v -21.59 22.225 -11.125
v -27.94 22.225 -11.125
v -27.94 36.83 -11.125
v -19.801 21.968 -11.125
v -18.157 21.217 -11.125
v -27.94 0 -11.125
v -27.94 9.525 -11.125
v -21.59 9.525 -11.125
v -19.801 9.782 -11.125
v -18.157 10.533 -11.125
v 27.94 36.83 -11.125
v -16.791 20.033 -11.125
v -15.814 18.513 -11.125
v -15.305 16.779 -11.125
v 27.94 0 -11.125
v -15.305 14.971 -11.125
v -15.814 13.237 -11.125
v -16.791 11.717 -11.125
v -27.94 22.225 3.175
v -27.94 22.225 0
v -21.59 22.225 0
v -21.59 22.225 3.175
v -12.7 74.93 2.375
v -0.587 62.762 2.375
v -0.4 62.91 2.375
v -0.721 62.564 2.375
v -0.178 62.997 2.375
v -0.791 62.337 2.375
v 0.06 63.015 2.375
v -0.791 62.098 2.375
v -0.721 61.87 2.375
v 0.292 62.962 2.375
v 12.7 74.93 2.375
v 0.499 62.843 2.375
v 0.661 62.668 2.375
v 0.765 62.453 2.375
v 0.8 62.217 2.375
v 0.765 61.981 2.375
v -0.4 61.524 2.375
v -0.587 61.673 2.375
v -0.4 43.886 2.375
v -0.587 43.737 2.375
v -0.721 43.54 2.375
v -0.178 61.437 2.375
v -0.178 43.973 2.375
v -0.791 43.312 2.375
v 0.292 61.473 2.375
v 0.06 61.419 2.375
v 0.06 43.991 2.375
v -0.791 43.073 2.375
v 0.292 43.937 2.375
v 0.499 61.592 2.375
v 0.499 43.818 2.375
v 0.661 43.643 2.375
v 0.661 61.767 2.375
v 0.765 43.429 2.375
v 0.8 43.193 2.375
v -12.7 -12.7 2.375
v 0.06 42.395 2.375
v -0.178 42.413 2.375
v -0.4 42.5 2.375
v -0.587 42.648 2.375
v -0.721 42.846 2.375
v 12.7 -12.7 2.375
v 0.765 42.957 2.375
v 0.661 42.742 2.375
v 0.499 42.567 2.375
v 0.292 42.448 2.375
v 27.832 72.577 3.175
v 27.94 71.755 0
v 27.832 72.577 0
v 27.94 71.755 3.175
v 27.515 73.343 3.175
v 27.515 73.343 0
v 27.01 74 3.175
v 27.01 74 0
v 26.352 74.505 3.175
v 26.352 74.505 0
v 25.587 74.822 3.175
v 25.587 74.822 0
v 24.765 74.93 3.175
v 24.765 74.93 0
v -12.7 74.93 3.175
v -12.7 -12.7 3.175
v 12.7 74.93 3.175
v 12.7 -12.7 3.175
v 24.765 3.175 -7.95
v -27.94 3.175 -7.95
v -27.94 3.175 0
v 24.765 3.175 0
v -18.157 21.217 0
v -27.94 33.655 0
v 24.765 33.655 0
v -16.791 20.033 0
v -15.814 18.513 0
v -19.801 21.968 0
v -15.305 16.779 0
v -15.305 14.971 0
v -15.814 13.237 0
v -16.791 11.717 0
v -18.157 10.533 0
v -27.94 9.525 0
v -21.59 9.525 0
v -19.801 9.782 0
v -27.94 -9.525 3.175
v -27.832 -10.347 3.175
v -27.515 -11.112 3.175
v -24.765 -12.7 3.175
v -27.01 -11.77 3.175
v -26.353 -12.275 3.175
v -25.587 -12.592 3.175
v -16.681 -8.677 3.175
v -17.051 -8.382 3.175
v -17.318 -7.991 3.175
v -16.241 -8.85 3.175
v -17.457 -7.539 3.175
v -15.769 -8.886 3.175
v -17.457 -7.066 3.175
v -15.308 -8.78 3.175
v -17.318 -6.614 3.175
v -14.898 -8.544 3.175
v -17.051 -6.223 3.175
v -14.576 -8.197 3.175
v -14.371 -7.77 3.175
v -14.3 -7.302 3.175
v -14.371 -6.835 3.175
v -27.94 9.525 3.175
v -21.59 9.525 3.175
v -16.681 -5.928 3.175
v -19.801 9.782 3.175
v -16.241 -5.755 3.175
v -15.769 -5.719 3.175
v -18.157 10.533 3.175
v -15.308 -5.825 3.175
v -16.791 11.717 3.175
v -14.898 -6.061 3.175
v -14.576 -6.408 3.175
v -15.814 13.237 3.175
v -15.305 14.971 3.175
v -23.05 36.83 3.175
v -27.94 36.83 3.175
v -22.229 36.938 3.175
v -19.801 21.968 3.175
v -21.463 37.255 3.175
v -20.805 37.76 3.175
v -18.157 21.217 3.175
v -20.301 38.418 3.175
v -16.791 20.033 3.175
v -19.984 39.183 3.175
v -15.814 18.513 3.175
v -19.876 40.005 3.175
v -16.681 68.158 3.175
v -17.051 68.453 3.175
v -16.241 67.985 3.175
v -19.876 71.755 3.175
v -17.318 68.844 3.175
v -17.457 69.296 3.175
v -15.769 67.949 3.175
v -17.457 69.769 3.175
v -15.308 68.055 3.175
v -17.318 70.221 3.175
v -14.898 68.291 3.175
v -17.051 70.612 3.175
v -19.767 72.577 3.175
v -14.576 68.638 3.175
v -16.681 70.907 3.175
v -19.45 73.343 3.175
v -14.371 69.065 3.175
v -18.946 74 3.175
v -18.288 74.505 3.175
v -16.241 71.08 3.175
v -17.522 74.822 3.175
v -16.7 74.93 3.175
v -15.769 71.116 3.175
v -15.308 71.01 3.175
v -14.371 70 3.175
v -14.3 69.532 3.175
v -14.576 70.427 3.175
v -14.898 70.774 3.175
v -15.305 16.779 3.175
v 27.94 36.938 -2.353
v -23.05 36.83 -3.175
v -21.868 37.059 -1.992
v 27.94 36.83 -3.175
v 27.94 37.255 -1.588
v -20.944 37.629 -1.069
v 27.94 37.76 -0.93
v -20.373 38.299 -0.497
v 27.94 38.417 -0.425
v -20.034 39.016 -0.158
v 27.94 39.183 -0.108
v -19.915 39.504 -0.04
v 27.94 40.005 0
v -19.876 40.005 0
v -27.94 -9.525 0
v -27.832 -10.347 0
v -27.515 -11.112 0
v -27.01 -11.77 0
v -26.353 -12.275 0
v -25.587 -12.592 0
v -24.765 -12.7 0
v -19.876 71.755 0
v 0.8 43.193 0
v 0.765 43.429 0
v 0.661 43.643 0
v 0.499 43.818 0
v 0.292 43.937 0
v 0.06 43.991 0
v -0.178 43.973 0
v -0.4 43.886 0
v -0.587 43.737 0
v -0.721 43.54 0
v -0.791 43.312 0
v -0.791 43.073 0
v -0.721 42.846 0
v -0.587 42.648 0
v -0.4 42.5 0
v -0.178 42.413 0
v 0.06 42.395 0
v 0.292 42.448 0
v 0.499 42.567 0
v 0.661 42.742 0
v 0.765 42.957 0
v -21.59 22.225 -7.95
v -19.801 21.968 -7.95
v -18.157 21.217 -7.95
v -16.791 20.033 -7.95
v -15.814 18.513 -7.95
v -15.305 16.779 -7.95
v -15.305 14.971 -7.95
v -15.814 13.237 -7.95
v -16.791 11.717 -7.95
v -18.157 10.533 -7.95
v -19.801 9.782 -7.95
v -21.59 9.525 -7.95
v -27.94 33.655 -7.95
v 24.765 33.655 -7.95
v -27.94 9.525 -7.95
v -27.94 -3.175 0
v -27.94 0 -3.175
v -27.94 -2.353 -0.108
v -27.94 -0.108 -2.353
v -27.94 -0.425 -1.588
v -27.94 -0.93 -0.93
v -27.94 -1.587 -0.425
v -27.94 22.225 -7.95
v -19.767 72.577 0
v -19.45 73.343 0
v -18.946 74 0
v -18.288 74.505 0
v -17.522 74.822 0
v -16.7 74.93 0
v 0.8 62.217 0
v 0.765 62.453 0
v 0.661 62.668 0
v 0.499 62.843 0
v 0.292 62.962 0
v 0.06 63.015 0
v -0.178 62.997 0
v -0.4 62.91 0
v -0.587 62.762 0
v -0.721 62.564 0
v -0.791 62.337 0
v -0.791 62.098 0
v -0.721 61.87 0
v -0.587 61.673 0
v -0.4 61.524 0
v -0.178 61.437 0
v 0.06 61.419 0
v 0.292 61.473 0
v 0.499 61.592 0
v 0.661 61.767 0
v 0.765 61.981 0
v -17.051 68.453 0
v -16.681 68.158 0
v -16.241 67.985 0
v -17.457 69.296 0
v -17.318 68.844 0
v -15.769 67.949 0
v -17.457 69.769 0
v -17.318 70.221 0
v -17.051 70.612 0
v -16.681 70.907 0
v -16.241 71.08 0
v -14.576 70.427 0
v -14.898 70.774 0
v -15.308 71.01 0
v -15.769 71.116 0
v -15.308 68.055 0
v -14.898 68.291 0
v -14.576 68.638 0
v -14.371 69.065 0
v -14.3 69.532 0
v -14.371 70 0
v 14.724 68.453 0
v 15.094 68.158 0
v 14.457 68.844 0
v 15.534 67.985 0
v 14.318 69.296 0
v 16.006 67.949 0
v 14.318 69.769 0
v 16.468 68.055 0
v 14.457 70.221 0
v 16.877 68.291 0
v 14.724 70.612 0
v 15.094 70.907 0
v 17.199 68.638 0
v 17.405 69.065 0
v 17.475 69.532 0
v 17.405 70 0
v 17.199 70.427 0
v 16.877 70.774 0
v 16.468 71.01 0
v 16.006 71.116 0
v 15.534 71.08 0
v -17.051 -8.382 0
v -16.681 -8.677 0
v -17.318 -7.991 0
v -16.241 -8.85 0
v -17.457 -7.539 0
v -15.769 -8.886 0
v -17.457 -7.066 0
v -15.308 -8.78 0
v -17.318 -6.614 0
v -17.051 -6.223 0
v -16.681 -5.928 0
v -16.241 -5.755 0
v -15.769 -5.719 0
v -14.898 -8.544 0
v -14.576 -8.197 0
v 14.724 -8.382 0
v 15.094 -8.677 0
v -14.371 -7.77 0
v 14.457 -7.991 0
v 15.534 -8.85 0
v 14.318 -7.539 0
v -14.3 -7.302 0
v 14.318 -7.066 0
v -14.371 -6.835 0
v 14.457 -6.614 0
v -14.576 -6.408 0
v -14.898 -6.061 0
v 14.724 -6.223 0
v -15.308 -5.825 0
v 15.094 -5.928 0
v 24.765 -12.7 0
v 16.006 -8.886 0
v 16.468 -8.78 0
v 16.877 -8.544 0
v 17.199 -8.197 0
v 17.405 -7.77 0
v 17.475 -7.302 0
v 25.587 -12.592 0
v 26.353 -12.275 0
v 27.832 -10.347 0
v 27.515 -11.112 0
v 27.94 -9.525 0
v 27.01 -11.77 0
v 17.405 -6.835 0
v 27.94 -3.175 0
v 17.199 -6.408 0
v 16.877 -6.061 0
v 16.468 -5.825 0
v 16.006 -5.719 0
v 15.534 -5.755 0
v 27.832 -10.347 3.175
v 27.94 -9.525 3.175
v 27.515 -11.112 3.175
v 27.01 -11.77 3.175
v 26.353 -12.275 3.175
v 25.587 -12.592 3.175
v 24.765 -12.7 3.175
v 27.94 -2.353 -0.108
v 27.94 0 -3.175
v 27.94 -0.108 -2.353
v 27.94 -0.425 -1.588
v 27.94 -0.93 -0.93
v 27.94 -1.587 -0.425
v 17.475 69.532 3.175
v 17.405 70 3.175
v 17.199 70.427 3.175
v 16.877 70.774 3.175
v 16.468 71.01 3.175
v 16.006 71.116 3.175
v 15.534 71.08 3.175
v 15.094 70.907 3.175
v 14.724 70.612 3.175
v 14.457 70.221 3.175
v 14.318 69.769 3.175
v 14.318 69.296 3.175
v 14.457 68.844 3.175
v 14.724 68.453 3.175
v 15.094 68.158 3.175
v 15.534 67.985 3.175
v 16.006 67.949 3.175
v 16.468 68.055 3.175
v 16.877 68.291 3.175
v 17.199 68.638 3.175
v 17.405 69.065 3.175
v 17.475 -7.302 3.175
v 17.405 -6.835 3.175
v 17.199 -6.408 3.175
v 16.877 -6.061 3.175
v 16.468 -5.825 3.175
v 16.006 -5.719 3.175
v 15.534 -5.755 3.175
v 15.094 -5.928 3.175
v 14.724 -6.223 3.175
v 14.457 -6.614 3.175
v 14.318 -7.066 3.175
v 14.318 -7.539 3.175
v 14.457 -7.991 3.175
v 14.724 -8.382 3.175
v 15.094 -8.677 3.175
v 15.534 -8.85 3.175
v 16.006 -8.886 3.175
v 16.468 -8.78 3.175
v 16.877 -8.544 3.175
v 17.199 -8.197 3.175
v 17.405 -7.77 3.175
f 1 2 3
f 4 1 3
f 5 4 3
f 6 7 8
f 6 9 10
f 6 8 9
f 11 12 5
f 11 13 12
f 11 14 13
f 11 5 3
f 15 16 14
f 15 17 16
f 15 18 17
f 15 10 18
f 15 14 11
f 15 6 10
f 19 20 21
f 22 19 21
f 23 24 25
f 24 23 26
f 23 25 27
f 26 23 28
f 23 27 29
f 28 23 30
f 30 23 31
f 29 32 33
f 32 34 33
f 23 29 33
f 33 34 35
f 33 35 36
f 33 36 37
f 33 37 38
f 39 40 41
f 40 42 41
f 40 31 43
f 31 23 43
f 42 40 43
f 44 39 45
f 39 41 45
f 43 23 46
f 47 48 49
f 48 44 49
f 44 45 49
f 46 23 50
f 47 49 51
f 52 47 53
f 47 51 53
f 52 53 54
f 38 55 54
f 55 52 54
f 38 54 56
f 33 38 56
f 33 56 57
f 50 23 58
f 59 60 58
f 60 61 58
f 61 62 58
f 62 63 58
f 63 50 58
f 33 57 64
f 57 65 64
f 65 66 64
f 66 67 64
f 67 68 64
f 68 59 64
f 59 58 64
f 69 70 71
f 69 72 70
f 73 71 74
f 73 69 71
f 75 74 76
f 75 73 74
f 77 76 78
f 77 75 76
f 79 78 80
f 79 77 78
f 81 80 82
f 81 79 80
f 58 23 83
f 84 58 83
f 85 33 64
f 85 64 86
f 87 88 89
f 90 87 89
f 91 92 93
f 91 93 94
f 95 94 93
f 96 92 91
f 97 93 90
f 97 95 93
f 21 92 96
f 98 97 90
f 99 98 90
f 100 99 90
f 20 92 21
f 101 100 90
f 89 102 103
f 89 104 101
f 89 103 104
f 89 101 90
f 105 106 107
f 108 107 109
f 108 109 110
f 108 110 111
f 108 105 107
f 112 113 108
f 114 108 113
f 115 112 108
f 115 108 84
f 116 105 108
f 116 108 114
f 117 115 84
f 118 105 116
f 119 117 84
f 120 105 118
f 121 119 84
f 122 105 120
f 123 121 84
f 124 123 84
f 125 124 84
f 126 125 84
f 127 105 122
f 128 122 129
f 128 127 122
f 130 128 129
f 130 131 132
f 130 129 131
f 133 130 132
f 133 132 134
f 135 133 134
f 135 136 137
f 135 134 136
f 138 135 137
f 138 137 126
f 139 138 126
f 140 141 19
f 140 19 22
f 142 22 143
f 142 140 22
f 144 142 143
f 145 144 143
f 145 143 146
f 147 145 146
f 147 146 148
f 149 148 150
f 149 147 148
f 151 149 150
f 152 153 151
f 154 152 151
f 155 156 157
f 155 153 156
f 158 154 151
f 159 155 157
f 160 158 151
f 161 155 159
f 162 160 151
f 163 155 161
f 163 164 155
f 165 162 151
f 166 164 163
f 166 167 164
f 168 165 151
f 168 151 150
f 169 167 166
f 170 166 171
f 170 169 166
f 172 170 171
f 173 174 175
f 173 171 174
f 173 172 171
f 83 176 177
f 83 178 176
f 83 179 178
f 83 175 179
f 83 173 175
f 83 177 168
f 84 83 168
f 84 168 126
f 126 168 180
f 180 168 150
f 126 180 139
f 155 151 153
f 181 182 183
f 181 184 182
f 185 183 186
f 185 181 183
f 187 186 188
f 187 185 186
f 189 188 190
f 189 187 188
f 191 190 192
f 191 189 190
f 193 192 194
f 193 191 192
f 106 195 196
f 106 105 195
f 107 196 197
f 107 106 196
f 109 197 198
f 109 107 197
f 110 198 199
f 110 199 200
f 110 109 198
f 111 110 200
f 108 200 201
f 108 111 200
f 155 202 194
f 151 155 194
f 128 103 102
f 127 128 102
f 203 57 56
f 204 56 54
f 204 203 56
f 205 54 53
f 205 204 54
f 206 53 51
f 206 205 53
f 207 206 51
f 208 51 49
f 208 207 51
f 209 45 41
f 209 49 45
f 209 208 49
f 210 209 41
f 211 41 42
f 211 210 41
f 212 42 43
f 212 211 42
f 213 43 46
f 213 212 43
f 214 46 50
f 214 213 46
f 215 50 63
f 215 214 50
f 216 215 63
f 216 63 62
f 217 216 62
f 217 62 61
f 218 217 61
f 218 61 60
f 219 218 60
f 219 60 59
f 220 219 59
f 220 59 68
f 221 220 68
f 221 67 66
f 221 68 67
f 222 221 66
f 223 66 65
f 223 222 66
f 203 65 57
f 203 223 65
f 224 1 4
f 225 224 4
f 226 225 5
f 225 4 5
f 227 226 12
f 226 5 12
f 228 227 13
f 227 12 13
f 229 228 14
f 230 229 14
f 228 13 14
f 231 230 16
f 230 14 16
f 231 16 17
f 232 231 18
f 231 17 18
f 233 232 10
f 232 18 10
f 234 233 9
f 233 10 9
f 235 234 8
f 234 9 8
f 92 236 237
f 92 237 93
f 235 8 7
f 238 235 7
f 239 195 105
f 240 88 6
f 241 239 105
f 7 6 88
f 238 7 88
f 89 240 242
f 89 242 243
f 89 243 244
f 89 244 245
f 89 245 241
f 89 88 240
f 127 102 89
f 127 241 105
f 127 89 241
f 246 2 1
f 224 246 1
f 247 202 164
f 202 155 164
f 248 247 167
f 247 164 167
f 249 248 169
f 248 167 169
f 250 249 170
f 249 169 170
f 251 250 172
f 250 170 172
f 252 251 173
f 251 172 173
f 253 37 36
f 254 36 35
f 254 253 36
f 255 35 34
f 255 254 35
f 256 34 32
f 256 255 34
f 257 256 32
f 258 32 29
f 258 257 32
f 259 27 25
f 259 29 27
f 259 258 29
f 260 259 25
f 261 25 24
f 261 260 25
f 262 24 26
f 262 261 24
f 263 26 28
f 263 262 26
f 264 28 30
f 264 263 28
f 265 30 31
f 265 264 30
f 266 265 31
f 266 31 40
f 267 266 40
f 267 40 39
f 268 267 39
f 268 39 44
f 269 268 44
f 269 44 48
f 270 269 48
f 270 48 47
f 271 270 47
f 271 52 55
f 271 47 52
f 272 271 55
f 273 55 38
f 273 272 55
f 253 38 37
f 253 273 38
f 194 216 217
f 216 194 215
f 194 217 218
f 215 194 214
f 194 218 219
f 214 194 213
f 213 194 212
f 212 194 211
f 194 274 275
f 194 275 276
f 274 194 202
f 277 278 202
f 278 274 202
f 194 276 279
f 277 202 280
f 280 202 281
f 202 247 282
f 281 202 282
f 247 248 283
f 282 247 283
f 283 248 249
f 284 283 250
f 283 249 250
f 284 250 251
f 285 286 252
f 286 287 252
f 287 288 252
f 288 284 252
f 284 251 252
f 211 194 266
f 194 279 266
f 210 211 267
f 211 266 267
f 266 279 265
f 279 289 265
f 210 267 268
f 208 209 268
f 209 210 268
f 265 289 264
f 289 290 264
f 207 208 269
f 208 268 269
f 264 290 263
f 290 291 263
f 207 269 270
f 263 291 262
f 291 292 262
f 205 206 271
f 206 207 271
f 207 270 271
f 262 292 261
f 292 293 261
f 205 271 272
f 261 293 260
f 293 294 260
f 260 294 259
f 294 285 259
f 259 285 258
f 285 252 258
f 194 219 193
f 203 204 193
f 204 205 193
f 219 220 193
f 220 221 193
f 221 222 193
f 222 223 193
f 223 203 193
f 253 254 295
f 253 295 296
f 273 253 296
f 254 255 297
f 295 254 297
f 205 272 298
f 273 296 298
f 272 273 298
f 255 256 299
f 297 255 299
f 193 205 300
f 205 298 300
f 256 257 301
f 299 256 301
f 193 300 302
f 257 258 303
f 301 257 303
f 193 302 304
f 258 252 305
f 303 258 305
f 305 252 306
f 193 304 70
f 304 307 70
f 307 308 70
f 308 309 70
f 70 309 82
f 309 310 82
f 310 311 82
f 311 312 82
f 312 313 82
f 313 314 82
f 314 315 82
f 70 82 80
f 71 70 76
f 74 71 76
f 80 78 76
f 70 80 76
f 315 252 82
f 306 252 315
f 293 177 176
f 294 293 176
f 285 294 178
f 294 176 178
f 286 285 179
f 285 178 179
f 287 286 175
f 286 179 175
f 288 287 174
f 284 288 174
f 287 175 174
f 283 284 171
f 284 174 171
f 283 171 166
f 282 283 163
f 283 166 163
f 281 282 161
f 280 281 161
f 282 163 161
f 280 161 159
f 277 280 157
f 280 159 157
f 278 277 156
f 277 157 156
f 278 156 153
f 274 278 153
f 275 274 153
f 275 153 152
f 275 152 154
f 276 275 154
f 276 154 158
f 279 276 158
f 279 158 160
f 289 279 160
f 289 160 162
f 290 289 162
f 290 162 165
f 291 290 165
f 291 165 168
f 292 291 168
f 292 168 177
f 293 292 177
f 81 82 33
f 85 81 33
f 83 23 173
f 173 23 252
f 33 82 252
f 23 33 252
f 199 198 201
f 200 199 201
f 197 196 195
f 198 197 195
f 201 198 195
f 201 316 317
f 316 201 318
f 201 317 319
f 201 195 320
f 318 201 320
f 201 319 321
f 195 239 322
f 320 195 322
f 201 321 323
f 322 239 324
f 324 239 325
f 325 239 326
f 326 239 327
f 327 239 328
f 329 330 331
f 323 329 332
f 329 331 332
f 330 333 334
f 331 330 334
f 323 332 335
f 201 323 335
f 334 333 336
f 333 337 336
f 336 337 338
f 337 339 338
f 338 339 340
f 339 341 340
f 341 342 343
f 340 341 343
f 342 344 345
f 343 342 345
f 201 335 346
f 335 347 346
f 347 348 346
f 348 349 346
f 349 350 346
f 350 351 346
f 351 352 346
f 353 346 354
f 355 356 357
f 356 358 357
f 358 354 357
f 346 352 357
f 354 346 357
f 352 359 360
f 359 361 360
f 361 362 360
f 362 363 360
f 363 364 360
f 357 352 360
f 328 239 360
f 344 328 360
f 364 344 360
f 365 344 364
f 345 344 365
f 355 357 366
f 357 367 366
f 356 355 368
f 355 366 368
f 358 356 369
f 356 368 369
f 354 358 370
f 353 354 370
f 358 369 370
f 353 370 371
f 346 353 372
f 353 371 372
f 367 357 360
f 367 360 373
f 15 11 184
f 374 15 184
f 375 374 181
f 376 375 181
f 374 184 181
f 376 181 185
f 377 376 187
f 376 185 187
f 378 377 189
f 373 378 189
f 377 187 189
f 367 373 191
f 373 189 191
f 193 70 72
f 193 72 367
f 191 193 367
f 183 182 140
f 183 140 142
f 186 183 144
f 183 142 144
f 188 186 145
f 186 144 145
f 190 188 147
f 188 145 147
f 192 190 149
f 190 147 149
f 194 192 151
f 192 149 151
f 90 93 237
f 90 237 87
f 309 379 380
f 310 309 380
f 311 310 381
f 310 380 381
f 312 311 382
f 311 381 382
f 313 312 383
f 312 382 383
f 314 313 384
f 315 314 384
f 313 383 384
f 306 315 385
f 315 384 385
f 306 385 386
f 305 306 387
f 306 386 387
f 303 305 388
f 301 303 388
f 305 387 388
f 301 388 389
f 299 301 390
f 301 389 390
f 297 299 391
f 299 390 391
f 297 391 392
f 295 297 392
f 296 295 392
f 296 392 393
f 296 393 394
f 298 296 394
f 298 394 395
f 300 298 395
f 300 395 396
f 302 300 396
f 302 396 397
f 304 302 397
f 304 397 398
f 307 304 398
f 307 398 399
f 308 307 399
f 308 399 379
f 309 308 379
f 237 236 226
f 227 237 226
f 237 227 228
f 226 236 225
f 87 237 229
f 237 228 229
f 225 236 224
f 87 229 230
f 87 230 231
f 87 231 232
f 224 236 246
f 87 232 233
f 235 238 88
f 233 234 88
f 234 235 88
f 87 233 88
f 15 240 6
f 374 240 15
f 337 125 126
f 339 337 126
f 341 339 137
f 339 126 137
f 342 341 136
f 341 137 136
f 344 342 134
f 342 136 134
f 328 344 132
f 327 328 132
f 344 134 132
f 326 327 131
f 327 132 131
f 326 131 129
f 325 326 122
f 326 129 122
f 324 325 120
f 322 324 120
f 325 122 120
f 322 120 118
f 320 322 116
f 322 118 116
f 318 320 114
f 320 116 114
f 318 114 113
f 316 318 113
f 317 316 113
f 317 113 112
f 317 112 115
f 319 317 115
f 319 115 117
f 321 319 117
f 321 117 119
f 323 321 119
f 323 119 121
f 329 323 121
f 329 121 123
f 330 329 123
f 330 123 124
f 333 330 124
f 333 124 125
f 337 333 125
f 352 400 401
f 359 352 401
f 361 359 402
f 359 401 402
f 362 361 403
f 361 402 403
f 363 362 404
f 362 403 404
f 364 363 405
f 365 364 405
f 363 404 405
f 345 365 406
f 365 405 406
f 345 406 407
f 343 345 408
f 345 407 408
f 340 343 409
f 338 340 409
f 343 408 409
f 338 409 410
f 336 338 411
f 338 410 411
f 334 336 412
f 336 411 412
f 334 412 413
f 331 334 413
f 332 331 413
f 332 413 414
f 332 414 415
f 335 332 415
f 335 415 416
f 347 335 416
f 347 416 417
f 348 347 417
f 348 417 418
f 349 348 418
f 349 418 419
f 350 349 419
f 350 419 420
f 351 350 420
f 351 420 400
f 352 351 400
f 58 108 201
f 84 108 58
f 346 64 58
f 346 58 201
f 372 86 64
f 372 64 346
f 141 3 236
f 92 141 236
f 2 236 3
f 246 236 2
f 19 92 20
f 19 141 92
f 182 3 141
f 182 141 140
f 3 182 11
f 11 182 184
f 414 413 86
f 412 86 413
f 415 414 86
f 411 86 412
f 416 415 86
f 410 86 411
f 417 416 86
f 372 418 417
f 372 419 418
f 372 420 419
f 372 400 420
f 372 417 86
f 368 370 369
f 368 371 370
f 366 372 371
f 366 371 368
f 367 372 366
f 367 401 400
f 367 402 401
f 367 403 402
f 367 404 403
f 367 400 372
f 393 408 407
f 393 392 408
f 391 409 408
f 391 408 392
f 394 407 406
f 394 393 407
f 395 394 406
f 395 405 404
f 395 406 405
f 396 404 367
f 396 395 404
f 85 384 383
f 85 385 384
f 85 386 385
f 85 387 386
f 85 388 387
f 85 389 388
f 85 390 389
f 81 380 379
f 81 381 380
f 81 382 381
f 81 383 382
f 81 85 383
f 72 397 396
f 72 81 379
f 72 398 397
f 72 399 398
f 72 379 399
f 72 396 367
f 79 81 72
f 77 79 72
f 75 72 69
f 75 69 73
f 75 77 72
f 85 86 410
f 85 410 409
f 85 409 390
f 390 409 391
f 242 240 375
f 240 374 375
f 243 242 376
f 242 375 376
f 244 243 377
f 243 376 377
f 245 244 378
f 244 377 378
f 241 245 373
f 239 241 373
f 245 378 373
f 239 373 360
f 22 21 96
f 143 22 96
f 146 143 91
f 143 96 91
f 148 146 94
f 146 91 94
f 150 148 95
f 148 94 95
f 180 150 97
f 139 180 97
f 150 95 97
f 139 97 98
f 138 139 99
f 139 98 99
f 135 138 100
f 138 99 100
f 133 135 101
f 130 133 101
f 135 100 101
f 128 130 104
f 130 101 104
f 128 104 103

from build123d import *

# Parameters (mm, degrees)
F0_R      = 0.8001
F1_DEPTH  = 3.175
F2_W      = 55.88
F2_H      = 36.83
F3_DEPTH  = 11.1252
F5_DEPTH  = 14.3012
F6_W      = 30.48
F6_H      = 7.9502
F7_DEPTH  = 52.705
F8_W      = 55.88
F8_H      = 3.175
F9_DEPTH  = 12.7
F10_R     = 3.175
F11_R     = 1.5875
F12_DEPTH = 14.3012
F13_W     = 25.4
F13_H     = 1.6002
F14_DEPTH = 87.631


with BuildPart() as f1:
    # F0 (on Top) → F1 (new body)
    with BuildSketch(Plane.XY):
        Polygon((-27.94, 0), (27.94, 0), (27.94, 74.93), (-19.8755, 74.93), (-19.8755, 36.83), (-27.94, 36.83), align=None)
        with Locations((0, 43.1927)):
            Circle(F0_R, mode=Mode.SUBTRACT)
        with Locations((0, 62.2173)):
            Circle(F0_R, mode=Mode.SUBTRACT)
    extrude(amount=F1_DEPTH)

    # F2 (on face) → F3 (join)
    with BuildSketch(Plane(origin=(0, 0, 0), x_dir=(1, 0, 0), z_dir=(0, 0, -1))):
        with Locations((0, -18.415)):
            Rectangle(F2_W, F2_H)
    extrude(amount=F3_DEPTH)

    # F4 (on face) → F5 (cut, through all)
    with BuildSketch(Plane(origin=(0, 0, -11.1252), x_dir=(1, 0, 0), z_dir=(0, 0, -1))):
        with BuildLine():
            Line((-27.94, -9.525), (-27.94, -22.225))
            Line((-27.94, -22.225), (-21.59, -22.225))
            ThreePointArc((-21.59, -22.225), (-15.24, -15.875), (-21.59, -9.525))
            Line((-21.59, -9.525), (-27.94, -9.525))
        make_face()
    extrude(amount=-F5_DEPTH, mode=Mode.SUBTRACT)

    # F6 (on face) → F7 (cut)
    with BuildSketch(Plane(origin=(-27.94, 0, 0), x_dir=(0, -1, 0), z_dir=(-1, 0, 0))):
        with Locations((-18.415, -3.9751)):
            Rectangle(F6_W, F6_H)
    extrude(amount=-F7_DEPTH, mode=Mode.SUBTRACT)

    # F8 (on face) → F9 (join)
    with BuildSketch(Plane.XZ):
        with Locations((0, 1.5875)):
            Rectangle(F8_W, F8_H)
    extrude(amount=F9_DEPTH)

    # F10
    f10_edges = [f1.edges().sort_by_distance(p)[0] for p in [
        (4.03225, 36.83, 0),
        (-19.8755, 36.83, 1.5875),
        (-19.8755, 74.93, 1.5875),
        (27.94, 74.93, 1.5875),
        (0, 0, 0),
        (-27.94, -12.7, 1.5875),
        (27.94, -12.7, 1.5875),
    ]]
    fillet(f10_edges, radius=F10_R)

    # F11 (on face) → F12 (cut, through all)
    with BuildSketch(Plane.XY.offset(3.175)):
        with Locations((-15.8877, 69.5325)):
            Circle(F11_R)
        with Locations((15.8877, 69.5325)):
            Circle(F11_R)
        with Locations((-15.8877, -7.3025)):
            Circle(F11_R)
        with Locations((15.8877, -7.3025)):
            Circle(F11_R)
    extrude(amount=-F12_DEPTH, mode=Mode.SUBTRACT)

    # F13 (on face) → F14 (cut, through all)
    with BuildSketch(Plane.XZ.offset(12.7)):
        with Locations((0, 3.175)):
            Rectangle(F13_W, F13_H)
    extrude(amount=-F14_DEPTH, mode=Mode.SUBTRACT)


solid = f1.part
